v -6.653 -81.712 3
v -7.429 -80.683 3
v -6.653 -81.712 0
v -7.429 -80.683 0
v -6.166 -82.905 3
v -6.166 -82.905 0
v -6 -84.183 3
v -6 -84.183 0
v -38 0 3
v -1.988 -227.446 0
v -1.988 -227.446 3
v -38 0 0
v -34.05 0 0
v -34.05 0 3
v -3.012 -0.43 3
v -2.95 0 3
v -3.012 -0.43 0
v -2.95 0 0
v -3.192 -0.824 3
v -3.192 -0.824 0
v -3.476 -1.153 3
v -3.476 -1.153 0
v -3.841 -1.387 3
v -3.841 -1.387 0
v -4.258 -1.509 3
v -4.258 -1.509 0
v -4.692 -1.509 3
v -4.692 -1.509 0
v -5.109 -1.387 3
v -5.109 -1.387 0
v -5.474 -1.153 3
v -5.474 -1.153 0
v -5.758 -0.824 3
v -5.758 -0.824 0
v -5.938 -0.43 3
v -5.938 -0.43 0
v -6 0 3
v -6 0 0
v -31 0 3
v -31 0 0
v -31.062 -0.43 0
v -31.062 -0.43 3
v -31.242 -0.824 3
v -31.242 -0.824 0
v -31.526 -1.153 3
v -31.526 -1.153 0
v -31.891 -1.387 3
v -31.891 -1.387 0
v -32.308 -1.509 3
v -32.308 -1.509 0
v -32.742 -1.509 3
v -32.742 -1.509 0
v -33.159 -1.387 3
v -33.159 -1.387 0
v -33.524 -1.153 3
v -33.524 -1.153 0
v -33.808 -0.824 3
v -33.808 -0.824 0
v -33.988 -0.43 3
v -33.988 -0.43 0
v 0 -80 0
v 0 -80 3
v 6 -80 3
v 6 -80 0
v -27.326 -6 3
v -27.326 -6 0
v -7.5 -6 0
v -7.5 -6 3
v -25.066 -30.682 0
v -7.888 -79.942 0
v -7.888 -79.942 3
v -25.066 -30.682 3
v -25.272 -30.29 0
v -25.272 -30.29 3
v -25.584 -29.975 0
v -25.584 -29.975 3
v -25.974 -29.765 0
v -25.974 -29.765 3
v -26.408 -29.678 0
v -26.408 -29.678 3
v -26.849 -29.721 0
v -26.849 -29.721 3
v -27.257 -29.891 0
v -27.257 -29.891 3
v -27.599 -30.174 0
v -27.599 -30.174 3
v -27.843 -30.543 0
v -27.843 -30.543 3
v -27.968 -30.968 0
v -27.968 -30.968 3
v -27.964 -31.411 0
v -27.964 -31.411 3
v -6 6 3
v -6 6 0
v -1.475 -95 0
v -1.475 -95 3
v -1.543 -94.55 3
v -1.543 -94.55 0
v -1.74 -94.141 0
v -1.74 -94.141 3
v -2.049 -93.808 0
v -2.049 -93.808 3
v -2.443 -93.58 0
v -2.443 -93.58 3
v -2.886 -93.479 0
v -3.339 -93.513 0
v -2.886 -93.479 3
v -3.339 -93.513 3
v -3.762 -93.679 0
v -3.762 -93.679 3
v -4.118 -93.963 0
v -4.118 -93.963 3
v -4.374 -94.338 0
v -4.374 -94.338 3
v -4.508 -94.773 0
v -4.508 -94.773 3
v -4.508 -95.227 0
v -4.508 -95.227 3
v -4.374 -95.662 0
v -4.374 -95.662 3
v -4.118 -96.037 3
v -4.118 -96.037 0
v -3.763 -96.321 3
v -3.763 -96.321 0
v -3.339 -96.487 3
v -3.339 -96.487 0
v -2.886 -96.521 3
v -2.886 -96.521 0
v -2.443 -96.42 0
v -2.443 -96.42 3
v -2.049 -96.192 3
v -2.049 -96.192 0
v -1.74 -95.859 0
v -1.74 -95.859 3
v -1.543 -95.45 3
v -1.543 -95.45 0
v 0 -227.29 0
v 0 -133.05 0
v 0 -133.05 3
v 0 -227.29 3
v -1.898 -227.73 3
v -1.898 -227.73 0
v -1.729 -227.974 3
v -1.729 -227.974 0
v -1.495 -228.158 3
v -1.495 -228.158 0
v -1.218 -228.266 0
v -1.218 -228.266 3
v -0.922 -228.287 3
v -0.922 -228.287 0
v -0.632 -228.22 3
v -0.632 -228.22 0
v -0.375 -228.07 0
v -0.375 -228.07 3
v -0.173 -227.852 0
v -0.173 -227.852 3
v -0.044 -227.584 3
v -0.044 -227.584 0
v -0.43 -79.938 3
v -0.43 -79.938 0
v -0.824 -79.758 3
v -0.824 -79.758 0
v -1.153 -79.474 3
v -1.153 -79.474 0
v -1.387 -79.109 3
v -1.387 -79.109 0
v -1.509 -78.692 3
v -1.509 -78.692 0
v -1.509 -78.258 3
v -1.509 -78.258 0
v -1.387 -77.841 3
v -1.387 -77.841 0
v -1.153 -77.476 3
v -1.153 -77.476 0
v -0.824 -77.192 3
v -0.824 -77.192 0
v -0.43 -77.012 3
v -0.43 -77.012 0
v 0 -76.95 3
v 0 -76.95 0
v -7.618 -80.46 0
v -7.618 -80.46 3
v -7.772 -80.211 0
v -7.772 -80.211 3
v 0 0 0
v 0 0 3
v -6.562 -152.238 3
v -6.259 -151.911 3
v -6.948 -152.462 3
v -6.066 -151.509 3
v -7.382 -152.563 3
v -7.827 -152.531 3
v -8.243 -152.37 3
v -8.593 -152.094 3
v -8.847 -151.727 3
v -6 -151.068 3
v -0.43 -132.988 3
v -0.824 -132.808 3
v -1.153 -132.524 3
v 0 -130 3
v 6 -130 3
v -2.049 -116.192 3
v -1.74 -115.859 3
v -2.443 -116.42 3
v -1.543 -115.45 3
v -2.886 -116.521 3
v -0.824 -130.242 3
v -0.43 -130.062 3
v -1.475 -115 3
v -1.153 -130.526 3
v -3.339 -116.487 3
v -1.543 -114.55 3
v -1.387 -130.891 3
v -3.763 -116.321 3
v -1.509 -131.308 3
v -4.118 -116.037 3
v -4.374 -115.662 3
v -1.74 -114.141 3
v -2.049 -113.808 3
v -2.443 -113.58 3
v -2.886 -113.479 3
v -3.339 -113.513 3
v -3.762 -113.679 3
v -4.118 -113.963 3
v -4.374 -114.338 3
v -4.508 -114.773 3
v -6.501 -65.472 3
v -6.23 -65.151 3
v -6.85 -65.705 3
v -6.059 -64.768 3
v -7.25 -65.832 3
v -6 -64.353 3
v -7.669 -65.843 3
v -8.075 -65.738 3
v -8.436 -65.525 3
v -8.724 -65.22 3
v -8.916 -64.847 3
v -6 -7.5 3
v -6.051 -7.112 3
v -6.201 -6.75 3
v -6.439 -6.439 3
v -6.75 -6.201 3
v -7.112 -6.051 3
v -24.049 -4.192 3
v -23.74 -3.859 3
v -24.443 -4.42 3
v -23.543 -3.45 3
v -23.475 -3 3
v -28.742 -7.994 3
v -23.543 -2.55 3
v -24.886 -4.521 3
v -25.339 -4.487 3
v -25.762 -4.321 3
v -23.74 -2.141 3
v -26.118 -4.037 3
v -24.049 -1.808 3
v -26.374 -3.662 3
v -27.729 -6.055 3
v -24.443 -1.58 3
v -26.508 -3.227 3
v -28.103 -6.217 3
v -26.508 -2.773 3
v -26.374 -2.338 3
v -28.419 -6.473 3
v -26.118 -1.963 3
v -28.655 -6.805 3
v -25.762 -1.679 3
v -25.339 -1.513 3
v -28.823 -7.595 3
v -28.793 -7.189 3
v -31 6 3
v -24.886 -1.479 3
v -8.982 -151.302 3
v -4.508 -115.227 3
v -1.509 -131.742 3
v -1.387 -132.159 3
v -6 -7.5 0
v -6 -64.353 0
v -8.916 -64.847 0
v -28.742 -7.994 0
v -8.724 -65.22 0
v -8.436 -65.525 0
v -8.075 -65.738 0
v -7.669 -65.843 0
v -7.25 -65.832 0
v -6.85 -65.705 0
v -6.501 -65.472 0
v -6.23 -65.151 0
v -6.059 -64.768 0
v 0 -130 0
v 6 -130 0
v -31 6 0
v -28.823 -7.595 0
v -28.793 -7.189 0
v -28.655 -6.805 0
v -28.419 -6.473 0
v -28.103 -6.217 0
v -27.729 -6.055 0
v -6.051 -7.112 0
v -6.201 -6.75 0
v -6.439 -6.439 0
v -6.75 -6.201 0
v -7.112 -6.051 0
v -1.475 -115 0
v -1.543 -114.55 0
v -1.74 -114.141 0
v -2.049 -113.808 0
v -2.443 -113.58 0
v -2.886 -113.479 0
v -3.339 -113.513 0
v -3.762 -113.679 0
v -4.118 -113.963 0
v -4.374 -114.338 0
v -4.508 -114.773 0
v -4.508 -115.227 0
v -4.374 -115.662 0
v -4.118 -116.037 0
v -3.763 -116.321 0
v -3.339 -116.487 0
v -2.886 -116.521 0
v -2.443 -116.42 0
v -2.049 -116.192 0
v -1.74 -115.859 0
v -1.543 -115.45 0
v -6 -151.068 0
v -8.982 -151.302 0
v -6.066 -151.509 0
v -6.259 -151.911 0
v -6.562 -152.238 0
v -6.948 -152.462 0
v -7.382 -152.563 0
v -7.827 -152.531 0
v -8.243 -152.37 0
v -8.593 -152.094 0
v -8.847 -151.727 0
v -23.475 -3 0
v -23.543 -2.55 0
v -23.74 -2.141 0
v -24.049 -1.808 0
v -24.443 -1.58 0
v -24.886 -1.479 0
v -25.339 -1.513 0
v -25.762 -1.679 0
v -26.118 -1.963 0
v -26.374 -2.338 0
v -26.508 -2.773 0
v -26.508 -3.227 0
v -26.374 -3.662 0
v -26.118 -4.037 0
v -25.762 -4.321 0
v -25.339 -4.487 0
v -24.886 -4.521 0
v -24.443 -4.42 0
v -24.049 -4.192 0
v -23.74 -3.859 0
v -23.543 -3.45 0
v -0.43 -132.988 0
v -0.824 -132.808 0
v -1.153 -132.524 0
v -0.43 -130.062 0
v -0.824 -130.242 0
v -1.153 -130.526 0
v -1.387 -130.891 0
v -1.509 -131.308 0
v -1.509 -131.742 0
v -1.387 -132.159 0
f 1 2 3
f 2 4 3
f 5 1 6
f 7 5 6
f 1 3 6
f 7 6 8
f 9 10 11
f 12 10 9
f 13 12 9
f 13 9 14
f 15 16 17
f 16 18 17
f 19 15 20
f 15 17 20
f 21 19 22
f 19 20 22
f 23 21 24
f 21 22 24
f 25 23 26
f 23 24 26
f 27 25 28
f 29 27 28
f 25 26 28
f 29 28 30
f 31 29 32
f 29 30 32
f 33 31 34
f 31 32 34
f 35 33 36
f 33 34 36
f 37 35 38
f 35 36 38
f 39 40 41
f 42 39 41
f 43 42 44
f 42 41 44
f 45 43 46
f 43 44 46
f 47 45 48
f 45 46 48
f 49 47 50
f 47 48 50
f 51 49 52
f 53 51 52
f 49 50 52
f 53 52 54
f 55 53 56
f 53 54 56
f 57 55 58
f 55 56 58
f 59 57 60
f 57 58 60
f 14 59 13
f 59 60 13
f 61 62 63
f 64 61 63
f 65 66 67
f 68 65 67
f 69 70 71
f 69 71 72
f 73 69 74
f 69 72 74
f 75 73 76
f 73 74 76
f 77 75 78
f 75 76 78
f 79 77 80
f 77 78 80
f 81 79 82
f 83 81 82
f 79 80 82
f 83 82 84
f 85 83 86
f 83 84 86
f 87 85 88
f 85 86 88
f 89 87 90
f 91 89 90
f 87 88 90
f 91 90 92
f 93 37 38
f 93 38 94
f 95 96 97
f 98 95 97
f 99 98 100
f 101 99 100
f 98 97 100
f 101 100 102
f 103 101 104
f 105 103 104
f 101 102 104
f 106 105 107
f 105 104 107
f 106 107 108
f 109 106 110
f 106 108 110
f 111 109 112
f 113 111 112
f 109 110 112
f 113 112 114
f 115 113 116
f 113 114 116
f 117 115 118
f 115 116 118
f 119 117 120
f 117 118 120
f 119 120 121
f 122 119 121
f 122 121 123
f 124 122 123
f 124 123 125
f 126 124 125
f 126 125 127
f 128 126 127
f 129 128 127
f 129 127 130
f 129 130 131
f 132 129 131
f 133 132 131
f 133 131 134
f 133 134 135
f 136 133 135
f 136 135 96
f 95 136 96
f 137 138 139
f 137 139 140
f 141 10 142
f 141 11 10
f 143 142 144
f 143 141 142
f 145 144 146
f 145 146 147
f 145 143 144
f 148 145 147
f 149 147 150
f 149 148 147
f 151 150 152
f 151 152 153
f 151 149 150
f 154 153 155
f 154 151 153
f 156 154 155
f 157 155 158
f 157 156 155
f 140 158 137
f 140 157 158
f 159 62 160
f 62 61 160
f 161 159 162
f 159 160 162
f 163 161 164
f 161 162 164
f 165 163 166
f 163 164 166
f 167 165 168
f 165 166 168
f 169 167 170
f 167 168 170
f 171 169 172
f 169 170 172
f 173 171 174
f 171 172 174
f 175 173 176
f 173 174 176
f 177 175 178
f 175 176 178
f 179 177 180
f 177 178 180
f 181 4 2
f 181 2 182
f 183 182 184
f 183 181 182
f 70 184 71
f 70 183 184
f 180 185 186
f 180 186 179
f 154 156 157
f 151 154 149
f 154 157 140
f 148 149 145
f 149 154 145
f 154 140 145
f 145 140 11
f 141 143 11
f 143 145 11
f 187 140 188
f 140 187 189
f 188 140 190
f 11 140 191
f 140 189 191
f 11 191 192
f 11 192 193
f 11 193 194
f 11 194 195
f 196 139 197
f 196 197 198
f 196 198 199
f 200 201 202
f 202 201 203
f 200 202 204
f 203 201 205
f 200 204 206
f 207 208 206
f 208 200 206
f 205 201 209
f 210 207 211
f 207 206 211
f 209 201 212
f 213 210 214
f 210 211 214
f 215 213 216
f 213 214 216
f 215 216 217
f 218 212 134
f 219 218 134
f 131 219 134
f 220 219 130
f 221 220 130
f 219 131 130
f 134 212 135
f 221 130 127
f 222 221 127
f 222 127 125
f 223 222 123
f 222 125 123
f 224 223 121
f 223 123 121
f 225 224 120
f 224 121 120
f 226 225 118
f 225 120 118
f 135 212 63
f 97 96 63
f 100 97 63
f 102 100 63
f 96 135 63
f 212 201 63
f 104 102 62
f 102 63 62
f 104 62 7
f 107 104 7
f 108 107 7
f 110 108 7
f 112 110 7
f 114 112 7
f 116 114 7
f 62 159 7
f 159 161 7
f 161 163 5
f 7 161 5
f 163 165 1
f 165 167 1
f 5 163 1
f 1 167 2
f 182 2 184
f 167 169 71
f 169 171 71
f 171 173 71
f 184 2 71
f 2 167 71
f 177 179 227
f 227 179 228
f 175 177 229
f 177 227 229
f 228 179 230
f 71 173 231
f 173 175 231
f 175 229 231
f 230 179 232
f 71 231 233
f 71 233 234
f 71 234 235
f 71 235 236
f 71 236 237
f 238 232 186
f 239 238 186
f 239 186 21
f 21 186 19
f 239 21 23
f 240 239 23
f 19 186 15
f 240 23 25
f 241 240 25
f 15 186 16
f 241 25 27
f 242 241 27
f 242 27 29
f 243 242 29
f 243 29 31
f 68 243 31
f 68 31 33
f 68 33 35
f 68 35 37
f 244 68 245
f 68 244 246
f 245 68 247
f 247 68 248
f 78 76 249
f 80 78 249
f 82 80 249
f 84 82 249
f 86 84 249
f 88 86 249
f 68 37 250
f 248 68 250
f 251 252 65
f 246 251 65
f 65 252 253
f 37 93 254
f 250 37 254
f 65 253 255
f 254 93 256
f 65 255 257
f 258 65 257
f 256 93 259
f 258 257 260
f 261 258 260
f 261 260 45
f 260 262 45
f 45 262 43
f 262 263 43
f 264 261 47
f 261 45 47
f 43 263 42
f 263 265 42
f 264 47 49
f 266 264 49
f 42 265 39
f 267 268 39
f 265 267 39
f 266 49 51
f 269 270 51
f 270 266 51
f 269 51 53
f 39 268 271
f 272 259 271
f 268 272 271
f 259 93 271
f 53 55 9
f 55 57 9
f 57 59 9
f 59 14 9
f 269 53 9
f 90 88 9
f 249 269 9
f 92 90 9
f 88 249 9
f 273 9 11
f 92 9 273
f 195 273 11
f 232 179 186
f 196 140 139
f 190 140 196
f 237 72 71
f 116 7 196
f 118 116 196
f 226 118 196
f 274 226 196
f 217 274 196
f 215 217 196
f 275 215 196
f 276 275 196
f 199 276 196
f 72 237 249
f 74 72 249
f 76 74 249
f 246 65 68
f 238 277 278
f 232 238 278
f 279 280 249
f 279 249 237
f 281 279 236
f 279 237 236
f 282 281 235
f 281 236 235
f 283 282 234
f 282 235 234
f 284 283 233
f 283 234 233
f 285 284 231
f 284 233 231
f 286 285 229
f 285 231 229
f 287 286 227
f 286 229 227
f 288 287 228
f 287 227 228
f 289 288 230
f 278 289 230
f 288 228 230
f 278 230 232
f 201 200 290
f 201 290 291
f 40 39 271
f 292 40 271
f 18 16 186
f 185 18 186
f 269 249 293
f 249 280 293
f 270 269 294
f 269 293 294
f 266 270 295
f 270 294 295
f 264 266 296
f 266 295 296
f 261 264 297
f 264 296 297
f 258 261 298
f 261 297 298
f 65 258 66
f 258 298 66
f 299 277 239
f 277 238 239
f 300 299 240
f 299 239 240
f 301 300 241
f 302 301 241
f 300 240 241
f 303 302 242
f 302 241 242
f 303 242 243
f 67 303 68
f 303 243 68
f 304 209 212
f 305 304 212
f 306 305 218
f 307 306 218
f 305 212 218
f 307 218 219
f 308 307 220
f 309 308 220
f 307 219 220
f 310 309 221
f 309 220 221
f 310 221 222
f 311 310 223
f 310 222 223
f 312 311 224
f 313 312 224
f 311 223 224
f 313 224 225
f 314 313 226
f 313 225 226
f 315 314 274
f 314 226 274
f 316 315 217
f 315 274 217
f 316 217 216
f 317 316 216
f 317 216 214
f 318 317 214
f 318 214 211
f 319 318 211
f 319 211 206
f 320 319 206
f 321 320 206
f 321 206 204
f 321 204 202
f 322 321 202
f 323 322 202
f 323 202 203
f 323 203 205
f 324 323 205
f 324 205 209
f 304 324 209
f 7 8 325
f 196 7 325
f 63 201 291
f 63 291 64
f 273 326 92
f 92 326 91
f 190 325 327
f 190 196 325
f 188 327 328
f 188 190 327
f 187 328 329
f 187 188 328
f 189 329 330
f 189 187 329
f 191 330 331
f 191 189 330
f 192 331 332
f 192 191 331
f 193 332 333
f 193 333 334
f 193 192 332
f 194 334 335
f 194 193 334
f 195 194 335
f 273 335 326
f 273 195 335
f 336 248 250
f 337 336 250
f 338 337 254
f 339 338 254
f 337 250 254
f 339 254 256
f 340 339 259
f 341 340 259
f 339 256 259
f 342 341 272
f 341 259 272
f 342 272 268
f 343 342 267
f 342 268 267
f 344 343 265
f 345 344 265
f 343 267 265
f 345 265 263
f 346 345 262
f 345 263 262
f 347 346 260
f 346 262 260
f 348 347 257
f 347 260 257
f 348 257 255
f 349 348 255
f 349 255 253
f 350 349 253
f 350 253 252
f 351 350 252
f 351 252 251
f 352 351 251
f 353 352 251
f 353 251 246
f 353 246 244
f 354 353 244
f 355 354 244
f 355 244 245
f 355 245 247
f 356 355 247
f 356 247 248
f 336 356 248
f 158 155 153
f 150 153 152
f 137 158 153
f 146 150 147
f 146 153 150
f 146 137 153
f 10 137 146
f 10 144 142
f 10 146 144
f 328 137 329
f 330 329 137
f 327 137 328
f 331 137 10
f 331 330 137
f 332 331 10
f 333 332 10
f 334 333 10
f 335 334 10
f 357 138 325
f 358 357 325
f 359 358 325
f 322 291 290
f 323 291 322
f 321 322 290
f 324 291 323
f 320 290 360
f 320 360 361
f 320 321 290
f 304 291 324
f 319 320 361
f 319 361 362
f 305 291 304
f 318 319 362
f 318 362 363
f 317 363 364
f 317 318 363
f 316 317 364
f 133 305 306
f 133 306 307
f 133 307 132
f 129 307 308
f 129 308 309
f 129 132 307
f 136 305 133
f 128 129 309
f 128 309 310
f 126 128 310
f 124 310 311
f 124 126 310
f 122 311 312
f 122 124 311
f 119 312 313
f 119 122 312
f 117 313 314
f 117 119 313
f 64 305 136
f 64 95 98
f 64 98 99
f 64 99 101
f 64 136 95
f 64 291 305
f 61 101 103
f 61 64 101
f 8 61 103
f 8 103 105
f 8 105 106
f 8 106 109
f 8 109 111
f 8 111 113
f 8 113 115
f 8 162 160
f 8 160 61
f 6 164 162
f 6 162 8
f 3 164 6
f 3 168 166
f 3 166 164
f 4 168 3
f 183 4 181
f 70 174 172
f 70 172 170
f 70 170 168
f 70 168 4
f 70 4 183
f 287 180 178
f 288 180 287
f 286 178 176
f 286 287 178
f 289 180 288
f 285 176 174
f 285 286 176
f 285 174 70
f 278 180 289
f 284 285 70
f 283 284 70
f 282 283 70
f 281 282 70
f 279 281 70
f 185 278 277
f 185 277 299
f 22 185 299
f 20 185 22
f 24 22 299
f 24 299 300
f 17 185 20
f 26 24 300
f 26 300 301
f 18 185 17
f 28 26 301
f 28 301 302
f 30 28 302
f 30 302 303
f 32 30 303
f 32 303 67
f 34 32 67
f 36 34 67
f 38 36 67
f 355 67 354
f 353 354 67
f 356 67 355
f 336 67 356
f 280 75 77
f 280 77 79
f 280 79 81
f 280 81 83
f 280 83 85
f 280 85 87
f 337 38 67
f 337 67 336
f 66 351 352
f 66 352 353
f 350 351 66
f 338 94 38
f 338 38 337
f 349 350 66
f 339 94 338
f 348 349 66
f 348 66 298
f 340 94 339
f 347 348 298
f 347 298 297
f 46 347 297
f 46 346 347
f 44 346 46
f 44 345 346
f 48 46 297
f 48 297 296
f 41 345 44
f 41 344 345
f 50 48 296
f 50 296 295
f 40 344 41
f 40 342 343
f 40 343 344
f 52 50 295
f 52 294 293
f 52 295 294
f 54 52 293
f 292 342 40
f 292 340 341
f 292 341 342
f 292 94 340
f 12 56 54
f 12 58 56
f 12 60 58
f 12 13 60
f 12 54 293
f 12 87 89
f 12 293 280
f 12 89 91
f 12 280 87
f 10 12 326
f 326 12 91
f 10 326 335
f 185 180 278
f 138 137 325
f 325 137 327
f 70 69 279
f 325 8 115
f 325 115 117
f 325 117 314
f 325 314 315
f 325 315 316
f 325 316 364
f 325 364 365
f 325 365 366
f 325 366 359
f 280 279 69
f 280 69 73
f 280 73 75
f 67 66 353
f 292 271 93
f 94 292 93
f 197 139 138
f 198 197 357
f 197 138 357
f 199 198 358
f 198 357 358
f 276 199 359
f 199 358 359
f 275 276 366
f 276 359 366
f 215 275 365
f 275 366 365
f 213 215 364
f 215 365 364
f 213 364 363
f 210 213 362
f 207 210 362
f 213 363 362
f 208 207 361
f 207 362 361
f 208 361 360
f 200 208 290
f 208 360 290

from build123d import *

# Parameters (mm, degrees)
EXTRUDE_1_DEPTH     = 3
SKETCH_2_R          = 1.525
CUT_EXTRUDE_1_DEPTH = 40
SKETCH_4_W          = 25
SKETCH_4_H          = 6
SKETCH_4_W_2        = 6
SKETCH_4_H_2        = 50
EXTRUDE_2_DEPTH     = 3
SKETCH_5_R          = 1.525
CUT_EXTRUDE_2_DEPTH = 40
CUT_EXTRUDE_3_DEPTH = 60
FILLET_1_R          = 1
FILLET_2_R          = 1.5
EXTRUDE_3_DEPTH     = 3
FILLET_3_R          = 5
FILLET_4_R          = 1.5


with BuildPart() as part:
    # 草图1 → 凸台-拉伸1 (new body)
    with BuildSketch(Plane.XY):
        Polygon((-38, 0), (0, 0), (0, -240), align=None)
    extrude(amount=EXTRUDE_1_DEPTH)

    # 草图2 → 切除-拉伸1 (cut)
    with BuildSketch(Plane.XY.offset(3)):
        with Locations((-3, -115)):
            Circle(SKETCH_2_R)
        with Locations((-3, -95)):
            Circle(SKETCH_2_R)
        with Locations((-25, -3)):
            Circle(SKETCH_2_R)
    extrude(amount=-CUT_EXTRUDE_1_DEPTH, mode=Mode.SUBTRACT)

    # 草图4 → 凸台-拉伸2 (add)
    with BuildSketch(Plane.XY.offset(3)):
        with Locations((-18.5, 3)):
            Rectangle(SKETCH_4_W, SKETCH_4_H)
        with Locations((3, -105)):
            Rectangle(SKETCH_4_W_2, SKETCH_4_H_2)
    extrude(amount=-EXTRUDE_2_DEPTH)

    # 草图5 → 切除-拉伸2 (cut)
    with BuildSketch(Plane(origin=(0, 0, 0), x_dir=(-1, 0, 0), z_dir=(0, 0, -1))):
        with Locations((0, -78.475)):
            Circle(SKETCH_5_R)
        with Locations((0, -131.525)):
            Circle(SKETCH_5_R)
        with Locations((4.475, 0)):
            Circle(SKETCH_5_R)
        with Locations((32.525, 0)):
            Circle(SKETCH_5_R)
    extrude(amount=-CUT_EXTRUDE_2_DEPTH, mode=Mode.SUBTRACT)

    # 草图6 → 切除-拉伸3 (cut)
    with BuildSketch(Plane(origin=(0, 0, 0), x_dir=(-1, 0, 0), z_dir=(0, 0, -1))):
        Polygon((6, -6), (6, -170.132932669), (31.987714339, -6), align=None)
    extrude(amount=-CUT_EXTRUDE_3_DEPTH, mode=Mode.SUBTRACT)

    # 圆角1
    fillet_1_edges = [part.edges().sort_by_distance(p)[0] for p in [
        (0, -240, 1.5),
    ]]
    fillet(fillet_1_edges, radius=FILLET_1_R)

    # 圆角2
    fillet_2_edges = [part.edges().sort_by_distance(p)[0] for p in [
        (-6, -6, 1.5),
        (-31.987714339, -6, 1.5),
        (-6, -170.132932669, 1.5),
    ]]
    fillet(fillet_2_edges, radius=FILLET_2_R)

    # 草图7 → 凸台-拉伸3 (add)
    with BuildSketch(Plane(origin=(0, 0, 0), x_dir=(-1, 0, 0), z_dir=(0, 0, -1))):
        with BuildLine():
            Line((7.888469575, -79.942320526), (33.26058288, -7.184345364))
            ThreePointArc((33.26058288, -7.184345364), (32.030659174, -4.637329919), (29.483643729, -5.867253624))
            Line((29.483643729, -5.867253624), (4.111530425, -78.625228786))
            ThreePointArc((4.111530425, -78.625228786), (5.34145413, -81.172244231), (7.888469575, -79.942320526))
        make_face()
    extrude(amount=-EXTRUDE_3_DEPTH)

    # 圆角3
    fillet_3_edges = [part.edges().sort_by_distance(p)[0] for p in [
        (-6, -81.283774656, 1.5),
    ]]
    fillet(fillet_3_edges, radius=FILLET_3_R)

    # 圆角4
    fillet_4_edges = [part.edges().sort_by_distance(p)[0] for p in [
        (-6, -73.209786217, 1.5),
        (-30.585668879, -14.855023959, 1.5),
        (-29.4373525, -6, 1.5),
    ]]
    fillet(fillet_4_edges, radius=FILLET_4_R)


solid = part.part
